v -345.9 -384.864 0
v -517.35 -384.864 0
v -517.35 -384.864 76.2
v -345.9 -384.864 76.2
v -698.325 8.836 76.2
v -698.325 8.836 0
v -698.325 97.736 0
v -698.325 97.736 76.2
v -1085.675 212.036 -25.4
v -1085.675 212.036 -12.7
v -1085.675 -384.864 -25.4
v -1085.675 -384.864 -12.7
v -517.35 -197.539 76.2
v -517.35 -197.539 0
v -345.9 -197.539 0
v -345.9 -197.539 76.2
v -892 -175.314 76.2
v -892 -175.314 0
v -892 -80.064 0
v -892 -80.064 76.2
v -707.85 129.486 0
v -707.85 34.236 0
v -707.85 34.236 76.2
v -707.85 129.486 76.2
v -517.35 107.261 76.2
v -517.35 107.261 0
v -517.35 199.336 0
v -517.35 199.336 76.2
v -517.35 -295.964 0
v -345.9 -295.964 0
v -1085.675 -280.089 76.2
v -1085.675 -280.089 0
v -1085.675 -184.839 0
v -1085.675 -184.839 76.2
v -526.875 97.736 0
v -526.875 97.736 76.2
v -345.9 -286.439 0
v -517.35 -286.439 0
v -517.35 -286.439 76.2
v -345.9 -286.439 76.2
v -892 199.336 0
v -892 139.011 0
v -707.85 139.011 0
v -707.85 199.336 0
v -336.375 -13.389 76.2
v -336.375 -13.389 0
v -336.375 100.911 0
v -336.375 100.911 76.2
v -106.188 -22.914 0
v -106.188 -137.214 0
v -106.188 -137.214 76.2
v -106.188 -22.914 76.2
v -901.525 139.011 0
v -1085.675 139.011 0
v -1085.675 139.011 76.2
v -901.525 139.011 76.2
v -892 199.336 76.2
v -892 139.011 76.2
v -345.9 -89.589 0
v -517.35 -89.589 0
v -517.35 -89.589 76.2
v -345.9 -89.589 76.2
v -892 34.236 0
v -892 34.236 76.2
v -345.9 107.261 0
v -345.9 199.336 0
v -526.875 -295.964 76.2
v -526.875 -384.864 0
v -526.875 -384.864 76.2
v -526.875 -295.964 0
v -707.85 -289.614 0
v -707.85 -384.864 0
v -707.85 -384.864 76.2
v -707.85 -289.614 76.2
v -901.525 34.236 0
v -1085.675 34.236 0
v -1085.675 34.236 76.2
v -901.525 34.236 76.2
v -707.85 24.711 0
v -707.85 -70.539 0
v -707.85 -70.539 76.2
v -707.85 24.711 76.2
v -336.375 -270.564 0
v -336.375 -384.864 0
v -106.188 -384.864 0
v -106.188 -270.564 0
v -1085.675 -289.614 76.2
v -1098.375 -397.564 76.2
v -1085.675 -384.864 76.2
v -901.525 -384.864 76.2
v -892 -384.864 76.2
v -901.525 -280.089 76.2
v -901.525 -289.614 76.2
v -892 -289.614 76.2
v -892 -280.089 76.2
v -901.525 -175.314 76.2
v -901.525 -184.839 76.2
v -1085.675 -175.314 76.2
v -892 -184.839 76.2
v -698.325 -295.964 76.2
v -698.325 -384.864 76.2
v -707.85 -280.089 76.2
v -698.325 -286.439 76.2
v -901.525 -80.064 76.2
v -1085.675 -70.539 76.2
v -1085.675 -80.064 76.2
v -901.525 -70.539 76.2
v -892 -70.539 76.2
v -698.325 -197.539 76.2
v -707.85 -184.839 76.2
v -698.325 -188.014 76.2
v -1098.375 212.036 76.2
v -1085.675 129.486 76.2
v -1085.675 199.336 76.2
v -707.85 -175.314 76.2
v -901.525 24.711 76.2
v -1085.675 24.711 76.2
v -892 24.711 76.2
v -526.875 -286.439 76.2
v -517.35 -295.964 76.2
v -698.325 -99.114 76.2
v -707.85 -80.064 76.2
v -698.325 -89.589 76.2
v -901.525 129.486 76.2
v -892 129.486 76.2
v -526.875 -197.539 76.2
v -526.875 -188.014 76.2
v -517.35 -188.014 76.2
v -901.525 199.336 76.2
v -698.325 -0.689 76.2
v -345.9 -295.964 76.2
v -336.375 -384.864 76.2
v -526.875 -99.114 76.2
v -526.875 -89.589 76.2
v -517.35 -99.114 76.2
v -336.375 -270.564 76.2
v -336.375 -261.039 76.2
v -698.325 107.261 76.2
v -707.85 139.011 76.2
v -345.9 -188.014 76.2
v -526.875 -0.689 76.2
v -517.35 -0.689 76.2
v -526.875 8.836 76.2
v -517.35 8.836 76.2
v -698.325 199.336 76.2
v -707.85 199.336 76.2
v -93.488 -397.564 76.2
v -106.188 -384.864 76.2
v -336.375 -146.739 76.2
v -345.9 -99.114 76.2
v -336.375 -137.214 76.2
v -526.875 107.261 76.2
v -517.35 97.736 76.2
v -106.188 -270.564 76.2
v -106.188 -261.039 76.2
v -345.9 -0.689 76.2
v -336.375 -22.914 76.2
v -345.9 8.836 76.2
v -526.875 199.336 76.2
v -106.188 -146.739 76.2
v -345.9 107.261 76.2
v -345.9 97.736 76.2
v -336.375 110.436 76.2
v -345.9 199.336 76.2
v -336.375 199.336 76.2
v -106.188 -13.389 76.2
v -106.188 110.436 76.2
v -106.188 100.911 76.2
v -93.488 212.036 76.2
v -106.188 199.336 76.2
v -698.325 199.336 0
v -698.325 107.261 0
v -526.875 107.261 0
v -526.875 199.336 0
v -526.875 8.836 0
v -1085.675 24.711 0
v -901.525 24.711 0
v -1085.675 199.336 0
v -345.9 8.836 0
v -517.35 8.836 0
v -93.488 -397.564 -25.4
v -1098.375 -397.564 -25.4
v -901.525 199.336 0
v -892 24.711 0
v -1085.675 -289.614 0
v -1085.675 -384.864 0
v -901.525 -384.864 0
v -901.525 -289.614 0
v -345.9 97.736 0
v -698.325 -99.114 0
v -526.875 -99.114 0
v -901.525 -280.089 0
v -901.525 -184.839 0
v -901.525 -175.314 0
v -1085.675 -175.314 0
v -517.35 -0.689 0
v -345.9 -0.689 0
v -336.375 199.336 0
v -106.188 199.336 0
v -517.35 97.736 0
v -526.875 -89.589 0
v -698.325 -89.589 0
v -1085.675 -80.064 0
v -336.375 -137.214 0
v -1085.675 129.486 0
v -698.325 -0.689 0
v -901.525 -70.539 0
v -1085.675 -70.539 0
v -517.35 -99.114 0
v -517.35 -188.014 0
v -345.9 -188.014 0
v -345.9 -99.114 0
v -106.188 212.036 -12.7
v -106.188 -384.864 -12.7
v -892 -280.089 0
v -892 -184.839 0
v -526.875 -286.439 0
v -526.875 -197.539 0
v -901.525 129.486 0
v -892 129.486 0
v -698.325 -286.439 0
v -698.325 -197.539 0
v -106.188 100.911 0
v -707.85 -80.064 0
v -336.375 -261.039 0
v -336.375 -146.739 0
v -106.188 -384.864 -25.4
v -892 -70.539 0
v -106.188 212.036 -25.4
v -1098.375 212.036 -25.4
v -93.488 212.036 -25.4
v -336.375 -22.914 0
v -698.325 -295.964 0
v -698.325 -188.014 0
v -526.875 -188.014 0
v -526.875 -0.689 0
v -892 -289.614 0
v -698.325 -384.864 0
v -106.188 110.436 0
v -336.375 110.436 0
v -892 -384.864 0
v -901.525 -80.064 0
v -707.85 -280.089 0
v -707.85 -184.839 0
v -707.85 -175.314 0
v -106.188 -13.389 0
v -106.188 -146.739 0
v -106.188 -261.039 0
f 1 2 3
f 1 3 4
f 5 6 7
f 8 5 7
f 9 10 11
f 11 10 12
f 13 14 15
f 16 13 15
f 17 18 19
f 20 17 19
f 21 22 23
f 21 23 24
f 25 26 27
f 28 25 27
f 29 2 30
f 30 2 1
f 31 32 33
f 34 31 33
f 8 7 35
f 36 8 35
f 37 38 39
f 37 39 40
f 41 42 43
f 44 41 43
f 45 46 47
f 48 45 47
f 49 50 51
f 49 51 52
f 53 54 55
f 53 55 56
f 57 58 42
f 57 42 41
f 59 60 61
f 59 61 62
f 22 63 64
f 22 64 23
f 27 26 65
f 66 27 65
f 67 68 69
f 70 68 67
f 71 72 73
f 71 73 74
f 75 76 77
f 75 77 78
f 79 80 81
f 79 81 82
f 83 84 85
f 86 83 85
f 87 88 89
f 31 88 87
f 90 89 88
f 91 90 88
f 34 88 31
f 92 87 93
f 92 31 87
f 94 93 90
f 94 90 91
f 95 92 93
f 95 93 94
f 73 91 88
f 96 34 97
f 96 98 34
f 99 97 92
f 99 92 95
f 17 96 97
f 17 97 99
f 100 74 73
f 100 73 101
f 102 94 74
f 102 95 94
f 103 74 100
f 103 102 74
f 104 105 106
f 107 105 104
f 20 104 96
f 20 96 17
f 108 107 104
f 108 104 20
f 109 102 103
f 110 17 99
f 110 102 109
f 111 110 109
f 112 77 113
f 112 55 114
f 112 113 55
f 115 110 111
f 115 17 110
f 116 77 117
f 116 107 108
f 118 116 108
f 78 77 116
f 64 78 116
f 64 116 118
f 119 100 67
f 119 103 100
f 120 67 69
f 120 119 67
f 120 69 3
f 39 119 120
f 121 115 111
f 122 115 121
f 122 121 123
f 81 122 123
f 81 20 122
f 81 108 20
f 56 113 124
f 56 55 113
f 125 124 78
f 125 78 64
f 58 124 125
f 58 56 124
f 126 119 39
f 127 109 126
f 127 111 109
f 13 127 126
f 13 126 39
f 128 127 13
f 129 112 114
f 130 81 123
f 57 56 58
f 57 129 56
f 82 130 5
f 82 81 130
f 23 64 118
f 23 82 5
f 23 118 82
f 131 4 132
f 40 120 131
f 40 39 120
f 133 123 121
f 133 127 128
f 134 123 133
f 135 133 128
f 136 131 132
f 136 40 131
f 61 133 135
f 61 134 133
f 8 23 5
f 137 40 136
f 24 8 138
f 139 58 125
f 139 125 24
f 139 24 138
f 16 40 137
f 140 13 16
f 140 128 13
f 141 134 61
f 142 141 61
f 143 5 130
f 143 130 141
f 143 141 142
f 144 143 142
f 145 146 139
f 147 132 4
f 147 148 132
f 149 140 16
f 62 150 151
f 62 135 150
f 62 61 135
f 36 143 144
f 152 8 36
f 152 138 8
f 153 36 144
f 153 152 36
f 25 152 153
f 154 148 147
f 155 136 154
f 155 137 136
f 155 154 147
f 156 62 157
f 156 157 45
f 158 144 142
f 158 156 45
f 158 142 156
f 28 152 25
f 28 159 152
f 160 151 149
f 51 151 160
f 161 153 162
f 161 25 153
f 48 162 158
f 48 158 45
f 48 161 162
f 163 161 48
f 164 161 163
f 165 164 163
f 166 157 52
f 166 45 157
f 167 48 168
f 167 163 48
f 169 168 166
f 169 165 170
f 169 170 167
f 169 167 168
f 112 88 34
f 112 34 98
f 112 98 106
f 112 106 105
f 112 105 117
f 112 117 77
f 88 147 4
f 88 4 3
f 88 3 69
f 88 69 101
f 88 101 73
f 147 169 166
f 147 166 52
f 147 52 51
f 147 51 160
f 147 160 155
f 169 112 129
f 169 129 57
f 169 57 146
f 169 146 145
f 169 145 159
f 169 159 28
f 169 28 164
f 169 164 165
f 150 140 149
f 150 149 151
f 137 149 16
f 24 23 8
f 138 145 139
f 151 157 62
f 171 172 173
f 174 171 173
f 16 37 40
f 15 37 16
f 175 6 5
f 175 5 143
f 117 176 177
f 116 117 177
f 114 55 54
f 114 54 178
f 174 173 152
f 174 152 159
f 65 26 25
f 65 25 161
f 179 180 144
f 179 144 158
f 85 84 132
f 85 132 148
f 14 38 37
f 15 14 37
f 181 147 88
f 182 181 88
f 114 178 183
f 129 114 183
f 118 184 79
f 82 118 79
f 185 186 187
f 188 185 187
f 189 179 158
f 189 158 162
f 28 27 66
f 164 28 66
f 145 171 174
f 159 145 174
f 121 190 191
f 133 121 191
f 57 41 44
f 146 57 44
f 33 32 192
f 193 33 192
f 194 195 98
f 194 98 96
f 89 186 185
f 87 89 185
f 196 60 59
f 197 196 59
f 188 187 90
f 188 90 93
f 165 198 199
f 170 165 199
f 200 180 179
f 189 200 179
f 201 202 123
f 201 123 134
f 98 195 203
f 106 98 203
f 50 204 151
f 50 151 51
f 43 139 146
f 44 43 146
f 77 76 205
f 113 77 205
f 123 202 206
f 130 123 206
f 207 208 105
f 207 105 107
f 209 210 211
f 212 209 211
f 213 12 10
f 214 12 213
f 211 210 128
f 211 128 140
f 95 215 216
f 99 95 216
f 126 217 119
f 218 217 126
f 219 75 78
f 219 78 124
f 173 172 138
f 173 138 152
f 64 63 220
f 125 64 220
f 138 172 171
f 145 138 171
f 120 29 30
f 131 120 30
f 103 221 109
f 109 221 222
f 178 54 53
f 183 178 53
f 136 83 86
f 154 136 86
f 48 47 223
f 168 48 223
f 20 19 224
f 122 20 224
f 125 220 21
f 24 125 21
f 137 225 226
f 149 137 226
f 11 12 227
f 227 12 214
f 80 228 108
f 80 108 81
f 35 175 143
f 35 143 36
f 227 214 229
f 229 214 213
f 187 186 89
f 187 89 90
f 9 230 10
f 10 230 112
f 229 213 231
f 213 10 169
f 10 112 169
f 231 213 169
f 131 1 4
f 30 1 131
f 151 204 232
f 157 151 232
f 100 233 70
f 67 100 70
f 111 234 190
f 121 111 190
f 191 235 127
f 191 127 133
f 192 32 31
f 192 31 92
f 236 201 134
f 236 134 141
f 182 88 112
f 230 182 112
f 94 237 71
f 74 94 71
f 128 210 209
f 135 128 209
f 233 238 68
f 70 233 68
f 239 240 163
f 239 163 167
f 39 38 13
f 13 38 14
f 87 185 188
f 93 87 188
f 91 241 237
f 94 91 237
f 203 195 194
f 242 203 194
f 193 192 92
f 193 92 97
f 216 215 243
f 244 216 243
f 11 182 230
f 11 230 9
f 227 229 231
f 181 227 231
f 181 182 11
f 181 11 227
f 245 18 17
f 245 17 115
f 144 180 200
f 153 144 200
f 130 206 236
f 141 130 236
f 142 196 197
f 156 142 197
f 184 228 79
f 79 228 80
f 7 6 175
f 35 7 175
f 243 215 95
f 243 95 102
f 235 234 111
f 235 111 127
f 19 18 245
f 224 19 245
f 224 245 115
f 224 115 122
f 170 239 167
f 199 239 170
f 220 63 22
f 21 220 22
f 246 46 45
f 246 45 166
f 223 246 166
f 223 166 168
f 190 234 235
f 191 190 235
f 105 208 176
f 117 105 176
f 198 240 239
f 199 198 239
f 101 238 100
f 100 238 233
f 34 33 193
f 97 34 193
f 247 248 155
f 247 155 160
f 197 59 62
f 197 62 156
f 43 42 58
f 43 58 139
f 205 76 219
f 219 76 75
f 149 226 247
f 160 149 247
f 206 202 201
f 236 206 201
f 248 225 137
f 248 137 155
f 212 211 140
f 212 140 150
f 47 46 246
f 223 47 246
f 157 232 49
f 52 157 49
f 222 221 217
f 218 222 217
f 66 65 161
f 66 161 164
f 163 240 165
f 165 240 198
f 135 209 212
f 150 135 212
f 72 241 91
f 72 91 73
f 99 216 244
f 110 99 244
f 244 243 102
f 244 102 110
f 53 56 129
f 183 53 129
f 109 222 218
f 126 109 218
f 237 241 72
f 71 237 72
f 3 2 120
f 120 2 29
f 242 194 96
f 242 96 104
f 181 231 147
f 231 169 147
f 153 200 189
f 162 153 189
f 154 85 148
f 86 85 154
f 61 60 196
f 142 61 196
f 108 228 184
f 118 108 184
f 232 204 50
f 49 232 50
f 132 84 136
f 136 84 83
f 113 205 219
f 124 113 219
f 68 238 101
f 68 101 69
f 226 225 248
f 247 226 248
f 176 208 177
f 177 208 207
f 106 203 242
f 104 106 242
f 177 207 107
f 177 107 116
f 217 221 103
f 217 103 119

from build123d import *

# Parameters (mm, degrees)
F0_W     = 1004.8875
F0_H     = 609.6
F0_W_2   = 184.15
F0_H_2   = 95.25
F0_W_3   = 171.45
F0_H_3   = 88.9
F0_W_4   = 230.1875
F0_H_4   = 114.3
F0_H_5   = 60.325
F0_H_6   = 92.075
F1_DEPTH = 76.2
F2_W     = 1004.8875
F2_H     = 609.6
F3_DEPTH = 12.7
F5_DEPTH = 12.7


with BuildPart() as f1:
    # F0 (on Top) → F1 (new body)
    with BuildSketch(Plane.XY):
        with Locations((-595.931344, -92.764258)):
            Rectangle(F0_W, F0_H)
        with Locations((-993.600094, -337.239258)):
            Rectangle(F0_W_2, F0_H_2, mode=Mode.SUBTRACT)
        with Locations((-799.925094, -337.239258)):
            Rectangle(F0_W_2, F0_H_2, mode=Mode.SUBTRACT)
        with Locations((-612.600094, -340.414258)):
            Rectangle(F0_W_3, F0_H_3, mode=Mode.SUBTRACT)
        with Locations((-993.600094, -232.464258)):
            Rectangle(F0_W_2, F0_H_2, mode=Mode.SUBTRACT)
        with Locations((-993.600094, -127.689258)):
            Rectangle(F0_W_2, F0_H_2, mode=Mode.SUBTRACT)
        with Locations((-799.925094, -232.464258)):
            Rectangle(F0_W_2, F0_H_2, mode=Mode.SUBTRACT)
        with Locations((-612.600094, -241.989258)):
            Rectangle(F0_W_3, F0_H_3, mode=Mode.SUBTRACT)
        with Locations((-799.925094, -127.689258)):
            Rectangle(F0_W_2, F0_H_2, mode=Mode.SUBTRACT)
        with Locations((-612.600094, -143.564258)):
            Rectangle(F0_W_3, F0_H_3, mode=Mode.SUBTRACT)
        with Locations((-431.625094, -340.414258)):
            Rectangle(F0_W_3, F0_H_3, mode=Mode.SUBTRACT)
        with Locations((-221.281344, -327.714258)):
            Rectangle(F0_W_4, F0_H_4, mode=Mode.SUBTRACT)
        with Locations((-431.625094, -241.989258)):
            Rectangle(F0_W_3, F0_H_3, mode=Mode.SUBTRACT)
        with Locations((-431.625094, -143.564258)):
            Rectangle(F0_W_3, F0_H_3, mode=Mode.SUBTRACT)
        with Locations((-221.281344, -203.889258)):
            Rectangle(F0_W_4, F0_H_4, mode=Mode.SUBTRACT)
        with Locations((-993.600094, -22.914258)):
            Rectangle(F0_W_2, F0_H_2, mode=Mode.SUBTRACT)
        with Locations((-799.925094, -22.914258)):
            Rectangle(F0_W_2, F0_H_2, mode=Mode.SUBTRACT)
        with Locations((-612.600094, -45.139258)):
            Rectangle(F0_W_3, F0_H_3, mode=Mode.SUBTRACT)
        with Locations((-612.600094, 53.285742)):
            Rectangle(F0_W_3, F0_H_3, mode=Mode.SUBTRACT)
        with Locations((-993.600094, 81.860742)):
            Rectangle(F0_W_2, F0_H_2, mode=Mode.SUBTRACT)
        with Locations((-993.600094, 169.173242)):
            Rectangle(F0_W_2, F0_H_5, mode=Mode.SUBTRACT)
        with Locations((-799.925094, 81.860742)):
            Rectangle(F0_W_2, F0_H_2, mode=Mode.SUBTRACT)
        with Locations((-799.925094, 169.173242)):
            Rectangle(F0_W_2, F0_H_5, mode=Mode.SUBTRACT)
        with Locations((-612.600094, 153.298242)):
            Rectangle(F0_W_3, F0_H_6, mode=Mode.SUBTRACT)
        with Locations((-431.625094, -45.139258)):
            Rectangle(F0_W_3, F0_H_3, mode=Mode.SUBTRACT)
        with Locations((-431.625094, 53.285742)):
            Rectangle(F0_W_3, F0_H_3, mode=Mode.SUBTRACT)
        with Locations((-221.281344, -80.064258)):
            Rectangle(F0_W_4, F0_H_4, mode=Mode.SUBTRACT)
        with Locations((-221.281344, 43.760742)):
            Rectangle(F0_W_4, F0_H_4, mode=Mode.SUBTRACT)
        with Locations((-431.625094, 153.298242)):
            Rectangle(F0_W_3, F0_H_6, mode=Mode.SUBTRACT)
        with Locations((-221.281344, 154.885742)):
            Rectangle(F0_W_4, F0_H_3, mode=Mode.SUBTRACT)
    extrude(amount=F1_DEPTH)

    # F2 (on face) → F3 (join)
    with BuildSketch(Plane(origin=(0, 0, 0), x_dir=(1, 0, 0), z_dir=(0, 0, -1))):
        with Locations((-595.931344, 92.764258)):
            Rectangle(F2_W, F2_H)
    extrude(amount=F3_DEPTH)

    # F4 (on face) → F5 (join)
    with BuildSketch(Plane(origin=(0, 0, -12.7), x_dir=(1, 0, 0), z_dir=(0, 0, -1))):
        Polygon((-1098.375094, 397.564258), (-1098.375094, -212.035742), (-1085.675094, -212.035742), (-1085.675094, 384.864258), (-106.187594, 384.864258), (-106.187594, -212.035742), (-93.487594, -212.035742), (-93.487594, 397.564258), align=None)
    extrude(amount=F5_DEPTH)


solid = f1.part
